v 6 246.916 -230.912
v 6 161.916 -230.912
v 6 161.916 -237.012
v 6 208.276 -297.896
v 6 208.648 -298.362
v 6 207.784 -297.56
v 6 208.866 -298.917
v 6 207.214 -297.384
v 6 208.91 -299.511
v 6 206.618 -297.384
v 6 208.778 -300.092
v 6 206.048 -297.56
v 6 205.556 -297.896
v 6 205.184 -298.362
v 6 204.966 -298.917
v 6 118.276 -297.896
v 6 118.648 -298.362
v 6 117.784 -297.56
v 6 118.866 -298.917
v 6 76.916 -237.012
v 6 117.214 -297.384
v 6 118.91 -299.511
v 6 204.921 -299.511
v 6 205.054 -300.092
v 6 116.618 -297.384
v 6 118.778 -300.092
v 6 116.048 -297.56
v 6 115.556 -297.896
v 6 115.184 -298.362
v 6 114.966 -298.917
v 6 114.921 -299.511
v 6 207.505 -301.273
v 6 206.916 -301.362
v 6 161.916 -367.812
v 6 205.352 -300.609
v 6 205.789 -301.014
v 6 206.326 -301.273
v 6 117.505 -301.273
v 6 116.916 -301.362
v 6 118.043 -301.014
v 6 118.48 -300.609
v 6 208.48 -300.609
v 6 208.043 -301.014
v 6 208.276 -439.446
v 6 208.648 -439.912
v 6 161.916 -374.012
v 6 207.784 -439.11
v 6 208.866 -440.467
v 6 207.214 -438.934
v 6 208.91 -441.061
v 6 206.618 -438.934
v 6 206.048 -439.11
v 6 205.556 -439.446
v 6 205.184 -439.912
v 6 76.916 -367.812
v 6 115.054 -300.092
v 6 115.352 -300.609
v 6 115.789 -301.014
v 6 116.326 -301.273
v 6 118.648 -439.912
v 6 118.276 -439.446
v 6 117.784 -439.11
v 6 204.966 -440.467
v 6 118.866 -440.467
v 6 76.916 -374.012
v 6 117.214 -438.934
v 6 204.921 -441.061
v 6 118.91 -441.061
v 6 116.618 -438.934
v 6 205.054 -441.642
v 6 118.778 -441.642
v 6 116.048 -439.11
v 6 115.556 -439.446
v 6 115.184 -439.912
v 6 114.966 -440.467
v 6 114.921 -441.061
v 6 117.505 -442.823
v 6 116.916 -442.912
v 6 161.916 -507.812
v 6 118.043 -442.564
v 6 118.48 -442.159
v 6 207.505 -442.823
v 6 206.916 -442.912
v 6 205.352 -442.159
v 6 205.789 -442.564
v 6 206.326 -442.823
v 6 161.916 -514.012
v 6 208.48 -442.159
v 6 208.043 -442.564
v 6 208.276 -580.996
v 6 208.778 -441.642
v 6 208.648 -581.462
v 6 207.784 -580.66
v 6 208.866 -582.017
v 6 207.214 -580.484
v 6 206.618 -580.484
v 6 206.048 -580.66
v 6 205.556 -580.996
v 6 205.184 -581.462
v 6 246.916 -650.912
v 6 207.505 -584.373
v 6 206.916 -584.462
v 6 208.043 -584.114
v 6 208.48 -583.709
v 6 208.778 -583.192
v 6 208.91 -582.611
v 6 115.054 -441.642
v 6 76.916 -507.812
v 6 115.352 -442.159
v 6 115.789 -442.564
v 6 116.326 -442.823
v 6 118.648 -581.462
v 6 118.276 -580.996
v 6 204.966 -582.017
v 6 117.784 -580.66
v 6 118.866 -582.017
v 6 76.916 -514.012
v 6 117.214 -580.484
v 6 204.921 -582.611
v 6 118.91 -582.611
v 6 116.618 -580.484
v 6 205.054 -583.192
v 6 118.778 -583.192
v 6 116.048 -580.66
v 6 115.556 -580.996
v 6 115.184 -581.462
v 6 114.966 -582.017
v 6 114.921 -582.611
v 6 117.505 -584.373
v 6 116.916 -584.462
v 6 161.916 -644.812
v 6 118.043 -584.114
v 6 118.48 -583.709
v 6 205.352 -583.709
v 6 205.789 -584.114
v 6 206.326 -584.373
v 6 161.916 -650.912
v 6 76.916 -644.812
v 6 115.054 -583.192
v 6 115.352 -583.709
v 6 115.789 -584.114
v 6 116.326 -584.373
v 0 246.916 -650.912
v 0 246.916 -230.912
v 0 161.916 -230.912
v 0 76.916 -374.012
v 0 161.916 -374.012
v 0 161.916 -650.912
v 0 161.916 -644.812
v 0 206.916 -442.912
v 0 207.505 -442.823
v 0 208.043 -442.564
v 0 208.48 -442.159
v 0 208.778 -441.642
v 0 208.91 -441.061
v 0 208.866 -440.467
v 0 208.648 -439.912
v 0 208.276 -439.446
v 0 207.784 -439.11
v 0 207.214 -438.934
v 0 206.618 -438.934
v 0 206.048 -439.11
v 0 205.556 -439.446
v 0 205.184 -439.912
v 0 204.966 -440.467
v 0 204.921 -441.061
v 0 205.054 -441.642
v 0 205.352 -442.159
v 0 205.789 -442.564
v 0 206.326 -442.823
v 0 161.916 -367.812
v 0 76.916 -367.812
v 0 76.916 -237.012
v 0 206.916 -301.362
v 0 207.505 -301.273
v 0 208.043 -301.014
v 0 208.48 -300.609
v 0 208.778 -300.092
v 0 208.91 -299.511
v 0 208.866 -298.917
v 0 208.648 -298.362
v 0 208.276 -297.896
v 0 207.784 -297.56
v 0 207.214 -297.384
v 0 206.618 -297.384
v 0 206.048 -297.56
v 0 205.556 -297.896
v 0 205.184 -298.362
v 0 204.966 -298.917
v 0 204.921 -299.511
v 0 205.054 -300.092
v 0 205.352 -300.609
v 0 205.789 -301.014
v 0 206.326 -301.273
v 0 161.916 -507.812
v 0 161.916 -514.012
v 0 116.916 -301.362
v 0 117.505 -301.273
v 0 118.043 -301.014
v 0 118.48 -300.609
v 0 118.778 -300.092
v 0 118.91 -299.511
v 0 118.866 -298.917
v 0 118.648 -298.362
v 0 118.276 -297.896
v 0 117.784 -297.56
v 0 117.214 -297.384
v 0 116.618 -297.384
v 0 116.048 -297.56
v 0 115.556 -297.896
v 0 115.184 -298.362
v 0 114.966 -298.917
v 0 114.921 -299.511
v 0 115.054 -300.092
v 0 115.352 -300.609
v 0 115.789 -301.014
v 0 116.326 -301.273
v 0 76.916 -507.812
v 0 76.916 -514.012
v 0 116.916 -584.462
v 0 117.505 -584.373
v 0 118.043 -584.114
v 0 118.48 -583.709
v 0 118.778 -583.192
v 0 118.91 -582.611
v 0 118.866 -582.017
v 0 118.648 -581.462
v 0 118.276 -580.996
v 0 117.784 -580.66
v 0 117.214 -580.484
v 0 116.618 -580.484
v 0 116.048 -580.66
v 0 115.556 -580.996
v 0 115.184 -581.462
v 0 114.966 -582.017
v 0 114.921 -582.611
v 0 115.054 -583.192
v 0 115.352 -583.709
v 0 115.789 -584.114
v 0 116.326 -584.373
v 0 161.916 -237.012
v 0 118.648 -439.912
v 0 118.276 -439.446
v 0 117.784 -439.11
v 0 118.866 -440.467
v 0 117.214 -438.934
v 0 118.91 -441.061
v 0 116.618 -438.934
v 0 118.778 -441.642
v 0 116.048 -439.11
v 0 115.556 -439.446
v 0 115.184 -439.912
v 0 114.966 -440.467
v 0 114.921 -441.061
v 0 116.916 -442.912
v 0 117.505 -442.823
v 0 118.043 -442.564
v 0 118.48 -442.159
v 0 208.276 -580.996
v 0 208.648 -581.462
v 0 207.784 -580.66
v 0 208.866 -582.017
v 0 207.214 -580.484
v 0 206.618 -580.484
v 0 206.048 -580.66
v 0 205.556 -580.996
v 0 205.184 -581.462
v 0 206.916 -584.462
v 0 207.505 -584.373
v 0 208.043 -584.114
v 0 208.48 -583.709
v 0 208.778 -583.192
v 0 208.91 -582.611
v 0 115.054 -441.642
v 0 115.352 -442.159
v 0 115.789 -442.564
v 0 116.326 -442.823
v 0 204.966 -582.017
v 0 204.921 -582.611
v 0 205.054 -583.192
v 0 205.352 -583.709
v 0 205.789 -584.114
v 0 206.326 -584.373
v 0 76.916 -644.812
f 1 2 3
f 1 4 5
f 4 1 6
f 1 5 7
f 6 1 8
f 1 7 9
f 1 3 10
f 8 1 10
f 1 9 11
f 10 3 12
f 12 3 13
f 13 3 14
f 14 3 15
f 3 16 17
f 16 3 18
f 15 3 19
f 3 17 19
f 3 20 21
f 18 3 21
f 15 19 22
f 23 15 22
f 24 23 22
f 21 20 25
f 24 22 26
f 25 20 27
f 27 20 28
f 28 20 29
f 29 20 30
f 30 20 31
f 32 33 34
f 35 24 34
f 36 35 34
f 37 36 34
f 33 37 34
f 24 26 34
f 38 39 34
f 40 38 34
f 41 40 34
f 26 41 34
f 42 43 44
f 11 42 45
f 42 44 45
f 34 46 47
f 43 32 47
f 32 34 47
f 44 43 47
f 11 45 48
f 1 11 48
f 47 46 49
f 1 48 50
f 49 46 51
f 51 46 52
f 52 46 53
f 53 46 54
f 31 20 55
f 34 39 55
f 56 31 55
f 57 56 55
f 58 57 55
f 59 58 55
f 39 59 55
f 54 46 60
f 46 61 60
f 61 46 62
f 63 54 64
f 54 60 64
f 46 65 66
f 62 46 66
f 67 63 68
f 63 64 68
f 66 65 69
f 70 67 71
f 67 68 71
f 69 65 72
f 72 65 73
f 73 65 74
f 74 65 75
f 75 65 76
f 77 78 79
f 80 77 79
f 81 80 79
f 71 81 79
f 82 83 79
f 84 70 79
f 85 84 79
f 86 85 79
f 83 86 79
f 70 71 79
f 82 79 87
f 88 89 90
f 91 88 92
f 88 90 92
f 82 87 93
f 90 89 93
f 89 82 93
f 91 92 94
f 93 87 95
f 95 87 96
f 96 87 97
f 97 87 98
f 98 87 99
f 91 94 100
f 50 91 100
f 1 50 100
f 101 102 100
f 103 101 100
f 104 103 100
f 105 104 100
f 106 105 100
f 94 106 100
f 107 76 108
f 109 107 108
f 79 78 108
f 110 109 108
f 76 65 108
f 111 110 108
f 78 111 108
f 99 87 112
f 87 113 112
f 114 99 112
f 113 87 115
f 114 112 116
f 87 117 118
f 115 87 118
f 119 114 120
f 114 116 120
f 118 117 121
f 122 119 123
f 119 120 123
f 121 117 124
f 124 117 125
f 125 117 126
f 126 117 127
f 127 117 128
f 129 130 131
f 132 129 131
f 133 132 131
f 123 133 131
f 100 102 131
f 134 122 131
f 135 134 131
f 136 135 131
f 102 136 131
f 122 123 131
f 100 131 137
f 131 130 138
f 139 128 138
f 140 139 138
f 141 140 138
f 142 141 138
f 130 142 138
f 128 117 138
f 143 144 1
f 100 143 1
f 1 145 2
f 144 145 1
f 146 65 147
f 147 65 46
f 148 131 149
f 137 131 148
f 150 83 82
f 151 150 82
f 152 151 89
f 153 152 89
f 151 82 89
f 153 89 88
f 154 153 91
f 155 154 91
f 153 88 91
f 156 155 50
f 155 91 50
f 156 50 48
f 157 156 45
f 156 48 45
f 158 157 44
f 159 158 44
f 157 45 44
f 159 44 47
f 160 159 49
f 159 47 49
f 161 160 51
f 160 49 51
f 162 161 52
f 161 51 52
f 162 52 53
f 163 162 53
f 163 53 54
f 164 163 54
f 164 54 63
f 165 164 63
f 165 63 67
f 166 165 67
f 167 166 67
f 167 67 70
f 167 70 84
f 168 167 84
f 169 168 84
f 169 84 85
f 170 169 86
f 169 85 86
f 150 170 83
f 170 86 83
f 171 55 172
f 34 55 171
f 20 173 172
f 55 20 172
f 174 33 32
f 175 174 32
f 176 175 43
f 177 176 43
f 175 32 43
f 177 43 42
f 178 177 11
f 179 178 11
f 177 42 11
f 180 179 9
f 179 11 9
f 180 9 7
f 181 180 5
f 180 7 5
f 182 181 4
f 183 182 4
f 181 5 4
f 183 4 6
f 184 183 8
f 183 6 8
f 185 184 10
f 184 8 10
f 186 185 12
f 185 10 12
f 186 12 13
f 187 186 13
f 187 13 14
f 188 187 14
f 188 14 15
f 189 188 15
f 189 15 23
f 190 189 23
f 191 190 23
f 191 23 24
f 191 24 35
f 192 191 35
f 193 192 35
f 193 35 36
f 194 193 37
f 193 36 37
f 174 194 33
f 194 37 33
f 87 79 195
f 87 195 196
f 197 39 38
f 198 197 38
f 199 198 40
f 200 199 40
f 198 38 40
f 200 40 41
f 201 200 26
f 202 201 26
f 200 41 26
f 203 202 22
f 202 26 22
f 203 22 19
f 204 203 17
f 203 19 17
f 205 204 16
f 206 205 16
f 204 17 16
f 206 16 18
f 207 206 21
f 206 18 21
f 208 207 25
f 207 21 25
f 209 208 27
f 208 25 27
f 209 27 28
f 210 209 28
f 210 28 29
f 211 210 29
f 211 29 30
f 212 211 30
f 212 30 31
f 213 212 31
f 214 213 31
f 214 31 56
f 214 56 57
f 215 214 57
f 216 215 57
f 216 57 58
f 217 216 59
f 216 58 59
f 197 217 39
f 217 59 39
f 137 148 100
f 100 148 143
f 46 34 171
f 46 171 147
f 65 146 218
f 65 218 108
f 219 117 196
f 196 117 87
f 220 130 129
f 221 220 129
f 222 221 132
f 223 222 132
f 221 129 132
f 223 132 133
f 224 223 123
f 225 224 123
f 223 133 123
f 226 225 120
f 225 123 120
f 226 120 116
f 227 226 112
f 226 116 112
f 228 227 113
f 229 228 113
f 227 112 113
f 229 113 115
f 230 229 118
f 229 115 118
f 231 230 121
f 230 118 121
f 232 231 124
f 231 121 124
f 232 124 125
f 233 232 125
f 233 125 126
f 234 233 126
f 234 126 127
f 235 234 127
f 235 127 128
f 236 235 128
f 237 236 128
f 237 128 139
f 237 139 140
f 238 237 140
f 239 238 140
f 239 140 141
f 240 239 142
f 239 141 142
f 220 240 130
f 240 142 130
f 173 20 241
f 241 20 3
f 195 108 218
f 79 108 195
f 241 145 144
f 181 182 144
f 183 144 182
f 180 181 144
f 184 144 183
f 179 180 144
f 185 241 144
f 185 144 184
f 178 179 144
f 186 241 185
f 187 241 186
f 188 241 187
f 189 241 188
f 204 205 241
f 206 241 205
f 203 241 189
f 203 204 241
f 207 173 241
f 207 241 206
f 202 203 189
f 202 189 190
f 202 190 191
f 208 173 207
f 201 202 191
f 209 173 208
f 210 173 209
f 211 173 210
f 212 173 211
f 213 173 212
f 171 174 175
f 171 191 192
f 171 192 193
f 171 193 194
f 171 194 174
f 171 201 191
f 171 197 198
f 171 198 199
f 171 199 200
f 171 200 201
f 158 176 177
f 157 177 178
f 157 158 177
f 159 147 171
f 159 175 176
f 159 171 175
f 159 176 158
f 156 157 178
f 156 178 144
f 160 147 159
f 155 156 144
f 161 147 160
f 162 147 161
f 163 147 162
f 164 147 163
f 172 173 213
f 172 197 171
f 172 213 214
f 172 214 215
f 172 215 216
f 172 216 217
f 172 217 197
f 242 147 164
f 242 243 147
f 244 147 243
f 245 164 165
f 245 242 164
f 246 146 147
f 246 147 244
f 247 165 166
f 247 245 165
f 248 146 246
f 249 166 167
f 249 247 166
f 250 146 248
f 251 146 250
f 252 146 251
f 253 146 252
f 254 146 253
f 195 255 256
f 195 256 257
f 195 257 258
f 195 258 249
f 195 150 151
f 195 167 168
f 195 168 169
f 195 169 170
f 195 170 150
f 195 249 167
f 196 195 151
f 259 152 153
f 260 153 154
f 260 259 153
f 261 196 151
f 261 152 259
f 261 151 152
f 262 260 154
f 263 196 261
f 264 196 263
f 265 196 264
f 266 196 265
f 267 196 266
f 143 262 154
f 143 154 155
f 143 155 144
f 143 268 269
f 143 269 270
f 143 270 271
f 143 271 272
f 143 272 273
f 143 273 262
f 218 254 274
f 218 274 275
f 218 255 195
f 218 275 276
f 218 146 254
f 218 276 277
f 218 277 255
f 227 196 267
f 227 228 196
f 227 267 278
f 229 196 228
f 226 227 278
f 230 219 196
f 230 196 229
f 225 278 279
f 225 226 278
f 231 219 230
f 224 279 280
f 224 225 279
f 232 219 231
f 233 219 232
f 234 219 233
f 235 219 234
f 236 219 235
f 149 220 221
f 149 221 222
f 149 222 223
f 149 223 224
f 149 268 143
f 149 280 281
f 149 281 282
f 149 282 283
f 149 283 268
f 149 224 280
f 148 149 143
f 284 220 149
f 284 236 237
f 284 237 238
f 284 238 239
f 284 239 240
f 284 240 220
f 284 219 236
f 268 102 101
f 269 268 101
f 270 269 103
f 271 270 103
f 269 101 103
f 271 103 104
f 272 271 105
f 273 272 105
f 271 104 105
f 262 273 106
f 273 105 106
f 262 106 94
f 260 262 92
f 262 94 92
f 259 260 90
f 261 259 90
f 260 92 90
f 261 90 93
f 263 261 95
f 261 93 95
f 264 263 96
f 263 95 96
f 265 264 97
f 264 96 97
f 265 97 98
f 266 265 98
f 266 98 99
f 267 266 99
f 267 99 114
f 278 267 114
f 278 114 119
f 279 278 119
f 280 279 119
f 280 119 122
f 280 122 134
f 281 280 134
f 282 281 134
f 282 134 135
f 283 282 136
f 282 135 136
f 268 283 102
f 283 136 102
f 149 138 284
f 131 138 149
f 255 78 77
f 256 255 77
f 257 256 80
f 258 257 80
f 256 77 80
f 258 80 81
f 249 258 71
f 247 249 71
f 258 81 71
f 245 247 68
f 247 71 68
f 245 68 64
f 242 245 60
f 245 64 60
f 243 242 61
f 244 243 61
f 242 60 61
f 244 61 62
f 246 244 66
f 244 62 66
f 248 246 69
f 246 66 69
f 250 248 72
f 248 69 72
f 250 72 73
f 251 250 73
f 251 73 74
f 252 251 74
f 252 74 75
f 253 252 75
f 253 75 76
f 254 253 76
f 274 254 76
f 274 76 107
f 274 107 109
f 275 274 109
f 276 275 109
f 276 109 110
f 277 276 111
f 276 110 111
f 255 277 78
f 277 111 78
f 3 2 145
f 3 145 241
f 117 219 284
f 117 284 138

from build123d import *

# Parameters (mm, degrees)
SKETCH3_W           = 420
SKETCH3_H           = 170
BOSS_EXTRUDE2_DEPTH = 6
SKETCH4_W           = 6.1
SKETCH4_H           = 85
SKETCH4_W_2         = 6.2
CUT_EXTRUDE1_DEPTH  = 6
SKETCH5_R           = 2
CUT_EXTRUDE2_DEPTH  = 6
SKETCH6_W           = 6
SKETCH6_H           = 380
BOSS_EXTRUDE3_DEPTH = 30
SKETCH7_W           = 6
SKETCH7_H           = 380
CUT_EXTRUDE3_DEPTH  = 2
SKETCH8_W           = 6
SKETCH8_H           = 116.9
SKETCH8_H_2         = 133.8
BOSS_EXTRUDE4_DEPTH = 28
SKETCH9_W           = 6
SKETCH9_H           = 6.2
BOSS_EXTRUDE5_DEPTH = 113
SKETCH10_W          = 6
SKETCH10_H          = 6.2
BOSS_EXTRUDE6_DEPTH = 113
SKETCH11_W          = 6.2
SKETCH11_H          = 113
CUT_EXTRUDE4_DEPTH  = 113
SKETCH13_W          = 6
SKETCH13_H          = 28
CUT_EXTRUDE5_DEPTH  = 1000


with BuildPart() as part:
    # Sketch3 → Boss-Extrude2 (new body)
    with BuildSketch(Plane(origin=(0, 0, 0), x_dir=(0, 0, -1), z_dir=(1, 0, 0))):
        with Locations((440.911700258, 161.915861829)):
            Rectangle(SKETCH3_W, SKETCH3_H)
    extrude(amount=BOSS_EXTRUDE2_DEPTH)

    # Sketch4 → Cut-Extrude1 (cut)
    with BuildSketch(Plane(origin=(6, 0, 0), x_dir=(0, 0, -1), z_dir=(1, 0, 0))):
        with Locations((233.961700258, 119.415861829)):
            Rectangle(SKETCH4_W, SKETCH4_H)
        with Locations((647.861700258, 119.415861829)):
            Rectangle(SKETCH4_W, SKETCH4_H)
        with Locations((370.911700258, 204.415861829)):
            Rectangle(SKETCH4_W_2, SKETCH4_H)
        with Locations((510.911700258, 204.415861829)):
            Rectangle(SKETCH4_W_2, SKETCH4_H)
    extrude(amount=-CUT_EXTRUDE1_DEPTH, mode=Mode.SUBTRACT)

    # Sketch5 → Cut-Extrude2 (cut)
    with BuildSketch(Plane(origin=(6, 0, 0), x_dir=(0, 0, -1), z_dir=(1, 0, 0))):
        with Locations((299.361700258, 206.915861829)):
            Circle(SKETCH5_R)
        with Locations((299.361700258, 116.915861829)):
            Circle(SKETCH5_R)
        with Locations((440.911700258, 206.915861829)):
            Circle(SKETCH5_R)
        with Locations((582.461700258, 206.915861829)):
            Circle(SKETCH5_R)
        with Locations((582.461700258, 116.915861829)):
            Circle(SKETCH5_R)
        with Locations((440.911700258, 116.915861829)):
            Circle(SKETCH5_R)
    extrude(amount=-CUT_EXTRUDE2_DEPTH, mode=Mode.SUBTRACT)

    # Sketch6 → Boss-Extrude3 (add)
    with BuildSketch(Plane.XZ.offset(-76.915861829)):
        with Locations((3, -440.911700258)):
            Rectangle(SKETCH6_W, SKETCH6_H)
    extrude(amount=BOSS_EXTRUDE3_DEPTH)

    # Sketch7 → Cut-Extrude3 (cut)
    with BuildSketch(Plane.XZ.offset(-46.915861829)):
        with Locations((3, -440.911700258)):
            Rectangle(SKETCH7_W, SKETCH7_H)
    extrude(amount=-CUT_EXTRUDE3_DEPTH, mode=Mode.SUBTRACT)

    # Sketch8 → Boss-Extrude4 (add)
    with BuildSketch(Plane(origin=(0, 246.915861829, 0), x_dir=(1, 0, 0), z_dir=(0, 1, 0))):
        with Locations((3, 309.361700258)):
            Rectangle(SKETCH8_W, SKETCH8_H)
        with Locations((3, 572.461700258)):
            Rectangle(SKETCH8_W, SKETCH8_H)
        with Locations((3, 440.911700258)):
            Rectangle(SKETCH8_W, SKETCH8_H_2)
    extrude(amount=BOSS_EXTRUDE4_DEPTH)

    # Sketch9 → Boss-Extrude5 (add)
    with BuildSketch(Plane(origin=(0, 161.915861829, 0), x_dir=(1, 0, 0), z_dir=(0, 1, 0))):
        with Locations((3, 370.911700258)):
            Rectangle(SKETCH9_W, SKETCH9_H)
    extrude(amount=BOSS_EXTRUDE5_DEPTH)

    # Sketch10 → Boss-Extrude6 (add)
    with BuildSketch(Plane(origin=(0, 161.915861829, 0), x_dir=(1, 0, 0), z_dir=(0, 1, 0))):
        with Locations((3, 510.911700258)):
            Rectangle(SKETCH10_W, SKETCH10_H)
    extrude(amount=BOSS_EXTRUDE6_DEPTH)

    # Sketch11 → Cut-Extrude4 (cut)
    with BuildSketch(Plane(origin=(6, 0, 0), x_dir=(0, 0, -1), z_dir=(1, 0, 0))):
        with Locations((370.911700258, 105.415861829)):
            Rectangle(SKETCH11_W, SKETCH11_H)
        with Locations((510.911700258, 105.415861829)):
            Rectangle(SKETCH11_W, SKETCH11_H)
    extrude(amount=-CUT_EXTRUDE4_DEPTH, mode=Mode.SUBTRACT)

    # Sketch13 → Cut-Extrude5 (cut)
    with BuildSketch(Plane.XY.offset(-250.911700258)):
        with Locations((3, 260.915861829)):
            Rectangle(SKETCH13_W, SKETCH13_H)
        with Locations((3, 62.915861829)):
            Rectangle(SKETCH13_W, SKETCH13_H)
    extrude(amount=-CUT_EXTRUDE5_DEPTH, mode=Mode.SUBTRACT)


solid = part.part
